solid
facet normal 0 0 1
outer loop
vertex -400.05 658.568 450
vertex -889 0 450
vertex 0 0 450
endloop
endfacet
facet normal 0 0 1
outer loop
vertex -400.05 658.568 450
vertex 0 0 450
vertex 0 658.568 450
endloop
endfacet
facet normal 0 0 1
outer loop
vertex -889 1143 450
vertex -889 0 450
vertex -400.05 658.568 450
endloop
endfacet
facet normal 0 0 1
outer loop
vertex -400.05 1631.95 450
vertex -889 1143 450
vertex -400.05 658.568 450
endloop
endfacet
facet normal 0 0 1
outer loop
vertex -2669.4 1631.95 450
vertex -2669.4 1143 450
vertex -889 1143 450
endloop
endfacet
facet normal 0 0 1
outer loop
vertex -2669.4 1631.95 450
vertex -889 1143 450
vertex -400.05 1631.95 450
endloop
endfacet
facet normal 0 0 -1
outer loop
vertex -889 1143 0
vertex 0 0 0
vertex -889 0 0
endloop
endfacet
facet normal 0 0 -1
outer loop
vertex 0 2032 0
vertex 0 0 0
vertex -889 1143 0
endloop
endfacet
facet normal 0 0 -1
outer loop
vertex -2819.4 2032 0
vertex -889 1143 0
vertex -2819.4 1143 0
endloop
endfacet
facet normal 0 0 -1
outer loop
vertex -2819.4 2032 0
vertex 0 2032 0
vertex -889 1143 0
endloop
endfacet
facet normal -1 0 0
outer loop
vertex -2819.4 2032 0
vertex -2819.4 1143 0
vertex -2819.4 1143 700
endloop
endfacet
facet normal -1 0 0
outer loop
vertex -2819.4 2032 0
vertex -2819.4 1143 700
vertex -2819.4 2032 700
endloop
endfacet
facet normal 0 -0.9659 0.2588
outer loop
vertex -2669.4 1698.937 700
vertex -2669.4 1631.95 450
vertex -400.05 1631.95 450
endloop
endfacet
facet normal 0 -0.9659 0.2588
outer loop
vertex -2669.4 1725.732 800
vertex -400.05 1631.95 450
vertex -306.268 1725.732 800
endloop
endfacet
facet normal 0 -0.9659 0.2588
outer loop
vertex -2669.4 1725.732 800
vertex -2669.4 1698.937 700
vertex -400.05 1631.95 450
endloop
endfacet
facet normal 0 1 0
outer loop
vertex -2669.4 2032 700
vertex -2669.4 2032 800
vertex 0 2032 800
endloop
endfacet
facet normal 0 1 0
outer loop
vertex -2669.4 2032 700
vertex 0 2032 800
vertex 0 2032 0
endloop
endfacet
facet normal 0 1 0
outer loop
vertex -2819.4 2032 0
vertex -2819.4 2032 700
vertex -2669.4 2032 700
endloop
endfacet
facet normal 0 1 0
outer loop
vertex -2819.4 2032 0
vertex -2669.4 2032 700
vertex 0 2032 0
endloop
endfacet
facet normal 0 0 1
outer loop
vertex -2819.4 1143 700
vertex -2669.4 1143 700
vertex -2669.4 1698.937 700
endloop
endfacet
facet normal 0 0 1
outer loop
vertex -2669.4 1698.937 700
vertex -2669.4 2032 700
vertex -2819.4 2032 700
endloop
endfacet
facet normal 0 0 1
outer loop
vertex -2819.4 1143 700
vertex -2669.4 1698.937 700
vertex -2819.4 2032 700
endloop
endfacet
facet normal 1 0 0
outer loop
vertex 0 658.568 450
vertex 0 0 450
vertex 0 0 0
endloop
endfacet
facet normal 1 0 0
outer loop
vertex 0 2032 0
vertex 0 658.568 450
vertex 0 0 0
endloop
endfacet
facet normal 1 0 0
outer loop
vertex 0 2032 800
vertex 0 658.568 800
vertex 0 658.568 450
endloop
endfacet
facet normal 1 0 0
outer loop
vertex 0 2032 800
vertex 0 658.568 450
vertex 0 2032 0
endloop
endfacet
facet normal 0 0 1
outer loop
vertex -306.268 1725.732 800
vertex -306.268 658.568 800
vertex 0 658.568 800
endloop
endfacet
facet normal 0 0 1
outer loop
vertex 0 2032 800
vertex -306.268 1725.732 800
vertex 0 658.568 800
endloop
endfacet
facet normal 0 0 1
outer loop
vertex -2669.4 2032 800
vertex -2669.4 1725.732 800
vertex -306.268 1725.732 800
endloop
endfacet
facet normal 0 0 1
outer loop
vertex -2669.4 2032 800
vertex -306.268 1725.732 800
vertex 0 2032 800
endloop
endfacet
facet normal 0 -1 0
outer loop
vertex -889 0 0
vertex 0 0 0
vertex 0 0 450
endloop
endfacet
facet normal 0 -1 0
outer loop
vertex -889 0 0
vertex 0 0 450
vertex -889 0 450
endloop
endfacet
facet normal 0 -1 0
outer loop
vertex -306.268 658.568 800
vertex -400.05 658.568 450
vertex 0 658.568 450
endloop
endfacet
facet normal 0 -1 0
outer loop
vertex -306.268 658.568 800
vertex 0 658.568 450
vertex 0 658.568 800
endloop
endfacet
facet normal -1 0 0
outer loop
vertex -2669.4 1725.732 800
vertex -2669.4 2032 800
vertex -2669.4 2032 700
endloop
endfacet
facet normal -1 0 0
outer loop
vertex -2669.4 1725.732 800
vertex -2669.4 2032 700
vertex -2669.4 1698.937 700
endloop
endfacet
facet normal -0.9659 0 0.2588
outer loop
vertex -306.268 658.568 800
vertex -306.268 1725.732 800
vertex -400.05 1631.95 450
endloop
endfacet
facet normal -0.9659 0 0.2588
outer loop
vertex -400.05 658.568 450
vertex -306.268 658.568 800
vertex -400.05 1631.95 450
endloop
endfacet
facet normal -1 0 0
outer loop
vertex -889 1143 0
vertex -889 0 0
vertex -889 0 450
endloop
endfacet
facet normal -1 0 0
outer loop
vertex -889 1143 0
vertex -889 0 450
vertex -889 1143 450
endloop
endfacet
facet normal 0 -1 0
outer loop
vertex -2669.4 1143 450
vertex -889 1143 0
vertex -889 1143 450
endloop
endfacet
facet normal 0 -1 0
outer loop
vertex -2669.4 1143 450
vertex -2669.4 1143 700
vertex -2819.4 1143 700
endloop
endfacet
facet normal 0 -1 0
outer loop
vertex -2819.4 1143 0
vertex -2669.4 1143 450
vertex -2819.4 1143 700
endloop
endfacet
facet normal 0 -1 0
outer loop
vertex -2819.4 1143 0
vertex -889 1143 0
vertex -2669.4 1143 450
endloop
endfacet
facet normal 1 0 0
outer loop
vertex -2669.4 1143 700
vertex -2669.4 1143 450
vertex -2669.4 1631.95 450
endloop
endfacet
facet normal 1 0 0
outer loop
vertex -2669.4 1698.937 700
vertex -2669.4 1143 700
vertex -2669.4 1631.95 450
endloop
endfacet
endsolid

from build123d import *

# Parameters (mm, degrees)
F1_DEPTH  = 450
F2_W      = 889
F2_H      = 150
F2_W_2    = 150
F2_H_2    = 889
F3_DEPTH  = 250
F5_DEPTH  = 1882
F8_W      = 658.5683822632
F8_H      = 350
F9_DEPTH  = 889.001
F11_W     = 3085.2428972721
F11_H     = 1244.7776794434
F12_DEPTH = 2819.401


with BuildPart() as f1:
    # F0 (on Top) → F1 (new body)
    with BuildSketch(Plane.XY):
        Polygon((0, 2032), (0, 0), (889, 0), (889, 1143), (2819.4, 1143), (2819.4, 2032), align=None)
    extrude(amount=F1_DEPTH)

    # F2 (on face) → F3 (join)
    with BuildSketch(Plane.XY.offset(450)):
        with Locations((444.5, 75)):
            Rectangle(F2_W, F2_H)
        with Locations((2744.4, 1587.5)):
            Rectangle(F2_W_2, F2_H_2)
    extrude(amount=F3_DEPTH)

    # F4 (on face) → F5 (join, through all)
    with BuildSketch(Plane(origin=(0, 150, 0), x_dir=(-1, 0, 0), z_dir=(0, 1, 0))):
        Polygon((-400.05, 450), (0, 450), (0, 800), (-306.2677826491, 800), align=None)
    extrude(amount=F5_DEPTH)

    # F6 (on face) → F7 (join, up to the next surface of F1)
    with BuildSketch(Plane(origin=(2669.4, 0, 0), x_dir=(0, -1, 0), z_dir=(-1, 0, 0))):
        Polygon((-2032, 800), (-2032, 450), (-1631.95, 450), (-1725.7322173509, 800), align=None)
    extrude(until=Until.NEXT)

    # F8 (on face) → F9 (cut, through all)
    with BuildSketch(Plane.YZ.offset(889)):
        with Locations((329.2841911316, 625)):
            Rectangle(F8_W, F8_H)
    extrude(amount=-F9_DEPTH, mode=Mode.SUBTRACT)

    # F10: F1 across plane


with BuildPart() as f1_1:
    add(f1.part)
    add(f1.part.mirror(Plane.YZ))

    # F11 (on Right) → F12 (cut, through all)
    with BuildSketch(Plane.YZ):
        with Locations((1233.0443114042, 330.7127356529)):
            Rectangle(F11_W, F11_H)
    extrude(amount=F12_DEPTH, mode=Mode.SUBTRACT)


solid = f1_1.part
